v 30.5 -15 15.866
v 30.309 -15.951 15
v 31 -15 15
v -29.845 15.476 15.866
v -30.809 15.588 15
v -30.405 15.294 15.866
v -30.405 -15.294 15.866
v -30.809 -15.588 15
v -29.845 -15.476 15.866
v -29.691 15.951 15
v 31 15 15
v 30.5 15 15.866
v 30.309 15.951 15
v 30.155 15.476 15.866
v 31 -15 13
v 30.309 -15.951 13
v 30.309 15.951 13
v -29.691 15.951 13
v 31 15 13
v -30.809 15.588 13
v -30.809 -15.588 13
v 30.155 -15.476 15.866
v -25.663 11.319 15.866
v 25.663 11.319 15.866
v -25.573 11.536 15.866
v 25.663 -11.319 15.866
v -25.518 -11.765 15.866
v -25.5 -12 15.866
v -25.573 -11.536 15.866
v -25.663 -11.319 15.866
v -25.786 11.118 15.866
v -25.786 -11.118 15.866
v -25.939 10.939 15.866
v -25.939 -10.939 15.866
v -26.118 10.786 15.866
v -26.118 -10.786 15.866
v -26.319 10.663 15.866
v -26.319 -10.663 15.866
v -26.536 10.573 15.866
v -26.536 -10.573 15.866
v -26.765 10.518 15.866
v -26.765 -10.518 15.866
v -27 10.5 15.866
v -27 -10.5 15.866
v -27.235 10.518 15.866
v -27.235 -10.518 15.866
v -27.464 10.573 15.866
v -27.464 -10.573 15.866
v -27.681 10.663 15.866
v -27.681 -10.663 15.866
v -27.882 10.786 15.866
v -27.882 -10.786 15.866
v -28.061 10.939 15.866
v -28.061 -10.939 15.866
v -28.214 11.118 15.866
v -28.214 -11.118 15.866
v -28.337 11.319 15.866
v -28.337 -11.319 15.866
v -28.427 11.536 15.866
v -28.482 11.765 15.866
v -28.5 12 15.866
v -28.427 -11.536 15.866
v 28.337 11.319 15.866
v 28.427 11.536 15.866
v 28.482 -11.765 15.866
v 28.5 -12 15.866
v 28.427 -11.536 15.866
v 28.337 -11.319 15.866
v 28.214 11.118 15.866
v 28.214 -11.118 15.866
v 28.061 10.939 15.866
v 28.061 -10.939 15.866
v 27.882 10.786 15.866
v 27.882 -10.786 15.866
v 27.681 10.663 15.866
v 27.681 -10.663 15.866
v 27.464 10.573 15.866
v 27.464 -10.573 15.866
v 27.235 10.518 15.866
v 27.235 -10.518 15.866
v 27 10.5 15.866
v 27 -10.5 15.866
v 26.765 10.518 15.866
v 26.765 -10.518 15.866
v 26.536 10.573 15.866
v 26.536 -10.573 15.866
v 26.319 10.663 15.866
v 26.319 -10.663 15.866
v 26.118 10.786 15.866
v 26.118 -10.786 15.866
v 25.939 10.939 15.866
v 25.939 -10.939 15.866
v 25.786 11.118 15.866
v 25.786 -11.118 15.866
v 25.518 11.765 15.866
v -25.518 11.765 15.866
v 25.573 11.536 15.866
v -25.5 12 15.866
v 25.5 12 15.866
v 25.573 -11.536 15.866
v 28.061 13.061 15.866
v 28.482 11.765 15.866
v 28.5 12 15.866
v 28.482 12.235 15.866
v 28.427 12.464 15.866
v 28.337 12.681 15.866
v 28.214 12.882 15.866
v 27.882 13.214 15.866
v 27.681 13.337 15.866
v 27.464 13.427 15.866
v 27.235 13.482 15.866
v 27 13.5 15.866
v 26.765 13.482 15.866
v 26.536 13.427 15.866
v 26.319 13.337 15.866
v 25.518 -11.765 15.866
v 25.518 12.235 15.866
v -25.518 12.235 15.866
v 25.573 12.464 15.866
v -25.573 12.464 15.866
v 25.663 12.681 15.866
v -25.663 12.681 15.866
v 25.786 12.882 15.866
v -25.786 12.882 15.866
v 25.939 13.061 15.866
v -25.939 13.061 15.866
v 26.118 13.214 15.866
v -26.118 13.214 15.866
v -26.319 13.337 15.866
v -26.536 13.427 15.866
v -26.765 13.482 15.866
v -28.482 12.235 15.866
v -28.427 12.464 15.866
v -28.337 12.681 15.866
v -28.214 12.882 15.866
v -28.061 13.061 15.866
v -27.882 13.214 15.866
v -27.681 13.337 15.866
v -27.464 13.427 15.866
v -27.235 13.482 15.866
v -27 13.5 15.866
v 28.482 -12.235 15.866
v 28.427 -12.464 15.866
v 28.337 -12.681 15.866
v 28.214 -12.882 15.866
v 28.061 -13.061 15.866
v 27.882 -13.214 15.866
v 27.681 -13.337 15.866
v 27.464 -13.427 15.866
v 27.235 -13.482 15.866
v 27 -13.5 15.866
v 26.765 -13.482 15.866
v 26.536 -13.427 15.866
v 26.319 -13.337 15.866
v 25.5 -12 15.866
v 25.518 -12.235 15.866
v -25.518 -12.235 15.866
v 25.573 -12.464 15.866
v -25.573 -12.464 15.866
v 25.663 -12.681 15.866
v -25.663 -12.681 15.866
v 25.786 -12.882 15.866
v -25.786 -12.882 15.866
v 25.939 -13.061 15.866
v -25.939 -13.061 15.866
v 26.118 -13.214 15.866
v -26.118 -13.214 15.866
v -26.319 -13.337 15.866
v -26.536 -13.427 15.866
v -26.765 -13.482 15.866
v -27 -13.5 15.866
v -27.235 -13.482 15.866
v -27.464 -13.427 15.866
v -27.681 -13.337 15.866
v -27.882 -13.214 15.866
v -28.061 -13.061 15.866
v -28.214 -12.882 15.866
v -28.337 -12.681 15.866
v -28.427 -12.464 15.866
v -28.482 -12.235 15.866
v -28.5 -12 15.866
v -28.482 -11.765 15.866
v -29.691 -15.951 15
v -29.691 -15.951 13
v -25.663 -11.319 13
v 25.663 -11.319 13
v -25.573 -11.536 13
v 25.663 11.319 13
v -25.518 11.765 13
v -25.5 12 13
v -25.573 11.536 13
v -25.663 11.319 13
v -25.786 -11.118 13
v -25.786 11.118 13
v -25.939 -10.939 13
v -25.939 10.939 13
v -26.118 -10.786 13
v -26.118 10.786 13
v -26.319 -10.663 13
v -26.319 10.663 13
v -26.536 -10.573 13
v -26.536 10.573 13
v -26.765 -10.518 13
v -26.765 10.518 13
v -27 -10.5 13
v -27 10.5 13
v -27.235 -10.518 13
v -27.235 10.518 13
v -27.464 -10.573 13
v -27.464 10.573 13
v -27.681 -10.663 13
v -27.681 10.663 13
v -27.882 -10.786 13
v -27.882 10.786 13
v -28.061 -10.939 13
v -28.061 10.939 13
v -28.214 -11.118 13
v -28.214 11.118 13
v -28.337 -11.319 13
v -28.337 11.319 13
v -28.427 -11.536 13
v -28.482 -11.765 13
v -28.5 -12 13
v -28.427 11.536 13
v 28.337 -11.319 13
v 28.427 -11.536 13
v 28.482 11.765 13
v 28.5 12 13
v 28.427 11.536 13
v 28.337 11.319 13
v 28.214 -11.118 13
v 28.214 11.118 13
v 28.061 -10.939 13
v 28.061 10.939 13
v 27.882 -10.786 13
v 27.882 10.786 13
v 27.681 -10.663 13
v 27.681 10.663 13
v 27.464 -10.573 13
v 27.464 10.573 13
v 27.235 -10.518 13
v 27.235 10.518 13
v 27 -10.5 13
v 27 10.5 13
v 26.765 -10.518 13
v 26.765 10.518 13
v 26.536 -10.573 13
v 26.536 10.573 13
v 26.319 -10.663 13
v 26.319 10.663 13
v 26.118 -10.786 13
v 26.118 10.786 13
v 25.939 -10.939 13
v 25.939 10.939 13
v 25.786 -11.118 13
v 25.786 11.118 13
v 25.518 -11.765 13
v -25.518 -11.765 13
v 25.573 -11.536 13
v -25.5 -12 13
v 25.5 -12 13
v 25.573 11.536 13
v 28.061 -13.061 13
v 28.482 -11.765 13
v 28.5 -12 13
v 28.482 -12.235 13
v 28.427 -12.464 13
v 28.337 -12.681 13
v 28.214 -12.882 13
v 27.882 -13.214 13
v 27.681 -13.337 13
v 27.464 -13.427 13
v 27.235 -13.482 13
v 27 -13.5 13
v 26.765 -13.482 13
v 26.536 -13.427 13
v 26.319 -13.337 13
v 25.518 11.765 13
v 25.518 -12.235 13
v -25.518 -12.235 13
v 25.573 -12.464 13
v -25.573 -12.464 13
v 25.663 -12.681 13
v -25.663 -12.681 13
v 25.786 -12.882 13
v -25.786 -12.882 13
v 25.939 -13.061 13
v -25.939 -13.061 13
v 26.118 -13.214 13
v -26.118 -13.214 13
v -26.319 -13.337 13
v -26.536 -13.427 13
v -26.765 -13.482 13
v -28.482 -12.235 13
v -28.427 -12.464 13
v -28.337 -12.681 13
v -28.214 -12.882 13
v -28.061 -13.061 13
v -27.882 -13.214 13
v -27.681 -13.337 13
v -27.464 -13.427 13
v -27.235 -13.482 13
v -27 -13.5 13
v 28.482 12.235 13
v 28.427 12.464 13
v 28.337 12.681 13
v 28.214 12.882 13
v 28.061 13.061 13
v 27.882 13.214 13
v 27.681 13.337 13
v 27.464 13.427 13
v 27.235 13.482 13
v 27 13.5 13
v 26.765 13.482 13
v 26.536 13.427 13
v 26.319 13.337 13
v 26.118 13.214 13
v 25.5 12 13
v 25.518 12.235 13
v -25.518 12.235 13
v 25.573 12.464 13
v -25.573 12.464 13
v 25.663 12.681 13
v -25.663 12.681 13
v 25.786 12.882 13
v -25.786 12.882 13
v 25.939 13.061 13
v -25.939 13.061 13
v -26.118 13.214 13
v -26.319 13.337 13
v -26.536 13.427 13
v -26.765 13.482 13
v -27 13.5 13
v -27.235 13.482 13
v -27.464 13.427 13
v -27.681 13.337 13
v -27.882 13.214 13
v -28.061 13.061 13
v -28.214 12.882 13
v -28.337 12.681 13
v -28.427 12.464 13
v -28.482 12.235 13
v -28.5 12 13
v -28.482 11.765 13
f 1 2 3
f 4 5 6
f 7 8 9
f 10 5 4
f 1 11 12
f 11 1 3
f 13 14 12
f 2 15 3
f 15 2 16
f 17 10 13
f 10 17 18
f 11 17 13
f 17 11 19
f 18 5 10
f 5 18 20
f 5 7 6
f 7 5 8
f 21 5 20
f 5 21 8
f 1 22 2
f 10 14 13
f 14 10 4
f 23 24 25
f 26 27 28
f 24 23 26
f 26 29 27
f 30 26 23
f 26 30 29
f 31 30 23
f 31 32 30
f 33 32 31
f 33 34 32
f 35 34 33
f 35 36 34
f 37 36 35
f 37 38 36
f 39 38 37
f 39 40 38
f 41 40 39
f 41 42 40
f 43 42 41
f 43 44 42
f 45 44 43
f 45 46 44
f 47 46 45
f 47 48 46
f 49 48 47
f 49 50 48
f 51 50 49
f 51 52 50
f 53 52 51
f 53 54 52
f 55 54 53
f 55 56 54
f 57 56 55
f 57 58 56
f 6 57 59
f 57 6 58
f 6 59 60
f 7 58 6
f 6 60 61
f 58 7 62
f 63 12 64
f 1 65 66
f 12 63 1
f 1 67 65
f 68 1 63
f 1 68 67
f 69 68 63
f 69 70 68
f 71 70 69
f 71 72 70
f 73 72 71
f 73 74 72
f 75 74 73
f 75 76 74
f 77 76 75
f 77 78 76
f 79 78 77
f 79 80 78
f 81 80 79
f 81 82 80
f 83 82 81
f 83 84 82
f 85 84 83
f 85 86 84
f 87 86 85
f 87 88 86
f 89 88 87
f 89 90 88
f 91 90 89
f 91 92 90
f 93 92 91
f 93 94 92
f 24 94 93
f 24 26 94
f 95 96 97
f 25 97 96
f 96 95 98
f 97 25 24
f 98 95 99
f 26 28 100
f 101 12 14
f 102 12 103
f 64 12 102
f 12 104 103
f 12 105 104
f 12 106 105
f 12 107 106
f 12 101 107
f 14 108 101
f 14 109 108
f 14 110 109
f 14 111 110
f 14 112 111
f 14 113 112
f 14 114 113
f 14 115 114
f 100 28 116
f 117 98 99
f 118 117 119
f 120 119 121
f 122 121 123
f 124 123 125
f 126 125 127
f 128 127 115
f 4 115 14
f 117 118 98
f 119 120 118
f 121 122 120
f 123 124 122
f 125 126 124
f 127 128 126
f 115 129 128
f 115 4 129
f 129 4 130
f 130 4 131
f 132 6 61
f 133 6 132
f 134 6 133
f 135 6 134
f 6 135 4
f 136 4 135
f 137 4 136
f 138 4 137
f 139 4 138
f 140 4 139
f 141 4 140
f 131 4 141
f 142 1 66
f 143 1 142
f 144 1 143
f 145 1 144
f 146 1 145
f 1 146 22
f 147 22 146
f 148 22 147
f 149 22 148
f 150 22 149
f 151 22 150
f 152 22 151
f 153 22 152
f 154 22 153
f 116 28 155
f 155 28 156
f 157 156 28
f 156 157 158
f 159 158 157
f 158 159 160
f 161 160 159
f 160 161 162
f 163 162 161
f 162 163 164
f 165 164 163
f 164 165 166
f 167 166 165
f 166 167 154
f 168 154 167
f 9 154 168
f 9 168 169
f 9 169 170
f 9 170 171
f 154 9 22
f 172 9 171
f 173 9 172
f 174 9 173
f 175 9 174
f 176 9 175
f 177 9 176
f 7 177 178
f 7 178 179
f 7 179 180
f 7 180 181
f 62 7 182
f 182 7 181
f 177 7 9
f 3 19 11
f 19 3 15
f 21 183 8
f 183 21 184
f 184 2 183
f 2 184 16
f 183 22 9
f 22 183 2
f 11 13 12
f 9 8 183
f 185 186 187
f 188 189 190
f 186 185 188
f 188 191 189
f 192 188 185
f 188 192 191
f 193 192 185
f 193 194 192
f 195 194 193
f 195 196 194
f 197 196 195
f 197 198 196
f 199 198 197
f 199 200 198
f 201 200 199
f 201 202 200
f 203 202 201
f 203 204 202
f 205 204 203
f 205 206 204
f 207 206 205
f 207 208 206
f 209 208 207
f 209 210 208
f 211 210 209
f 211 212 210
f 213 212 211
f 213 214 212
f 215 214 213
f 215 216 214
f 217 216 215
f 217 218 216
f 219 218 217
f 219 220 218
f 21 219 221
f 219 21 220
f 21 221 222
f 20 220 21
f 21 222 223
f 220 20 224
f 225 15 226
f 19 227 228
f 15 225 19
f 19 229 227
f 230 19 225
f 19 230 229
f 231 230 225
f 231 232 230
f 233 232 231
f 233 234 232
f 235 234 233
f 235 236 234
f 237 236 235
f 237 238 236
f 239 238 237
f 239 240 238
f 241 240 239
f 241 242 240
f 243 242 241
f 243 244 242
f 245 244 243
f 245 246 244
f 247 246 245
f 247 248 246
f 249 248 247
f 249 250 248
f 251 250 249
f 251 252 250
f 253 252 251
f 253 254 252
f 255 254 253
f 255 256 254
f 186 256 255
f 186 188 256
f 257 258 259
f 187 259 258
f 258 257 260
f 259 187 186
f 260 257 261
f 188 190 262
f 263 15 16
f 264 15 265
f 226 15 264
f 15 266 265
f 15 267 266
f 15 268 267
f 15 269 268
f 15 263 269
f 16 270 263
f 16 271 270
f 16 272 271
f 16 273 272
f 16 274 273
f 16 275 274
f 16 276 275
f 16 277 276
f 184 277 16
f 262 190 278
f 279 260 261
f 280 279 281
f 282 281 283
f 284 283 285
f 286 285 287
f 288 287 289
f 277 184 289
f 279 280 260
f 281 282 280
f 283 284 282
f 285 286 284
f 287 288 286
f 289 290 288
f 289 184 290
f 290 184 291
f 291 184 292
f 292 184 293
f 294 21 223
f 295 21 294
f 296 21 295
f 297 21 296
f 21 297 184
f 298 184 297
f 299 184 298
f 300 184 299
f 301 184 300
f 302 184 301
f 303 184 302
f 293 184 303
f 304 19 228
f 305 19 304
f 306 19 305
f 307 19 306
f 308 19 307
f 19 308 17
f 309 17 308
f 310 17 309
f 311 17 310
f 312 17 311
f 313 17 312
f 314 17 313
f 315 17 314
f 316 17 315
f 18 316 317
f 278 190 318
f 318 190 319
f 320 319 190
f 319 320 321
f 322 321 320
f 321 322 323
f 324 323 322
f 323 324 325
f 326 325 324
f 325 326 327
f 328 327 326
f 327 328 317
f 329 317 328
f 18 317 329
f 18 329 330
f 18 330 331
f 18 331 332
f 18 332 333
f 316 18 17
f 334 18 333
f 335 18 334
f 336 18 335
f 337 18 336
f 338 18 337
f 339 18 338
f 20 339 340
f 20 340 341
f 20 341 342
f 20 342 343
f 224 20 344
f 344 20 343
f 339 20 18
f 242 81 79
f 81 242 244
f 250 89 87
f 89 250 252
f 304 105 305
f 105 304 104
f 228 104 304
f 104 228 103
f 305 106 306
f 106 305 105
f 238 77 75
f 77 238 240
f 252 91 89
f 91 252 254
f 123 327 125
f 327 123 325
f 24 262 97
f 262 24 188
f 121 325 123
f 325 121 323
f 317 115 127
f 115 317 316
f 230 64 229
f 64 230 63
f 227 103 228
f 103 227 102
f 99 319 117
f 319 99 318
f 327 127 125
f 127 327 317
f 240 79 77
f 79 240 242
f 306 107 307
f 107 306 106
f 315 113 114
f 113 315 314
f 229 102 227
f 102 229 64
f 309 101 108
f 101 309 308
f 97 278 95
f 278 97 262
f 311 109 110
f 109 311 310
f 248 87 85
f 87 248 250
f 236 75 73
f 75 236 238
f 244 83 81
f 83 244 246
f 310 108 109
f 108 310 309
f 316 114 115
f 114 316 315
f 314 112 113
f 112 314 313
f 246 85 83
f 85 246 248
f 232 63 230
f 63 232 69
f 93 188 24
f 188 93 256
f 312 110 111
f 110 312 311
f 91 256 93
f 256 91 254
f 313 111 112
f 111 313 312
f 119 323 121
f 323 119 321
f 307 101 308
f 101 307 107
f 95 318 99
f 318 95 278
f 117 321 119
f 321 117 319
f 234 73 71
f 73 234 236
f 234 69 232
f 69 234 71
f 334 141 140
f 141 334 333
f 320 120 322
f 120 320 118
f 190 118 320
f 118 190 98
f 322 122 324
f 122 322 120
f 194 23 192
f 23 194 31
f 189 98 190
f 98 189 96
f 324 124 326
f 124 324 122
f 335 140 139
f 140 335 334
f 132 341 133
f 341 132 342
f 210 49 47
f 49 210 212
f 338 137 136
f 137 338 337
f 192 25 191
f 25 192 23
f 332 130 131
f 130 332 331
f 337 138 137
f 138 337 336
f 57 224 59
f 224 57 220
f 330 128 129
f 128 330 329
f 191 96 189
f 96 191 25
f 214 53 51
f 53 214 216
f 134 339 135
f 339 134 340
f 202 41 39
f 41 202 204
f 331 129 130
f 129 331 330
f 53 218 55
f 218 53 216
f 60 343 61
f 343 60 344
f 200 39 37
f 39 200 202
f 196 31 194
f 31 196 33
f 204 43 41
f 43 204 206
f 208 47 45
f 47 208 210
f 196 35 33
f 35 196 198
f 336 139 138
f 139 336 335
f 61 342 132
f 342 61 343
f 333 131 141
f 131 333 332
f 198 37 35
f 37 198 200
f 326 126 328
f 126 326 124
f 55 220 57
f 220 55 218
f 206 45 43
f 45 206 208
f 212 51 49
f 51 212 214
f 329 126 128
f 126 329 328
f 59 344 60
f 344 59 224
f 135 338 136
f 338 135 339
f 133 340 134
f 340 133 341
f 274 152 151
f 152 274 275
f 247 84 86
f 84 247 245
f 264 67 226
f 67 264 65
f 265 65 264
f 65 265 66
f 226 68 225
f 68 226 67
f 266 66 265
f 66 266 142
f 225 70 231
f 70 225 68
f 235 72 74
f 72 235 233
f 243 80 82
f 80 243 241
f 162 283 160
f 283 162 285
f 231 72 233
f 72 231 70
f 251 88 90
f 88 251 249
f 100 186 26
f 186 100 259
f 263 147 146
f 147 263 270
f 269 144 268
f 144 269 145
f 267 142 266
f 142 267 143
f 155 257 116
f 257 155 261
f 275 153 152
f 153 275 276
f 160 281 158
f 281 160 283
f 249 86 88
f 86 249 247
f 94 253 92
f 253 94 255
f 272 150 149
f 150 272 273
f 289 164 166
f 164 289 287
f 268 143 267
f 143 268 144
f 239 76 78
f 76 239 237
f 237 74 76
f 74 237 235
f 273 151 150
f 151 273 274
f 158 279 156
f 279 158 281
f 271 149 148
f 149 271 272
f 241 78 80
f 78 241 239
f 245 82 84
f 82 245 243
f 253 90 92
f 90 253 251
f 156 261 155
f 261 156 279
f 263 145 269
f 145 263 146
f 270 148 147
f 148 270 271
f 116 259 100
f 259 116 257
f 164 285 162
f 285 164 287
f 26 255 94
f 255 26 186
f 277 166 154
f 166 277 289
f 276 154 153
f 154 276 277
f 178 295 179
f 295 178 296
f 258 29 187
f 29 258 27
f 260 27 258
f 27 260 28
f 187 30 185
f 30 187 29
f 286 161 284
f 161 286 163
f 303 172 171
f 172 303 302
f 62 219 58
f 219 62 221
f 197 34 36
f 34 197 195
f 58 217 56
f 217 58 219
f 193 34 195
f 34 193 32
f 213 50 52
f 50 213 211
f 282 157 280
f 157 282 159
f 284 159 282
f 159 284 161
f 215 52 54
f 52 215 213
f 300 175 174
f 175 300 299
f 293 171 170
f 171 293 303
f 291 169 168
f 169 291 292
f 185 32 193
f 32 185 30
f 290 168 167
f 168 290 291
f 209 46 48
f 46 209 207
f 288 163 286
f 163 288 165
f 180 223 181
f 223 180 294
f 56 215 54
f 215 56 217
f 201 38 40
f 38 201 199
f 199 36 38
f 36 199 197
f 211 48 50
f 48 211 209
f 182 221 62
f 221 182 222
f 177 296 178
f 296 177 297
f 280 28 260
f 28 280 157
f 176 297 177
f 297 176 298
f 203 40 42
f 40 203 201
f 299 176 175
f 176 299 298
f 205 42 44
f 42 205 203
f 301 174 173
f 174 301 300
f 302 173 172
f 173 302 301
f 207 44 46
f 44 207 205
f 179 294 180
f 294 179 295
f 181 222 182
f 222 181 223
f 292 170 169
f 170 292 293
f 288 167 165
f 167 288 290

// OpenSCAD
// SolarVerteiler


module Outer(){

    minkowski(){
        cube([60,30,20],center=true);
        sphere(r=1);
    }   
}
module Inner() {
    translate([0,0,3])
    cube([56,26,20],center=true);
}


module Hole() {
    translate([0,10,0])
    rotate([90,0,0])
    cylinder(d=8,h=20,center=true,$fn=40);
}

module Deckel() {
    translate([0,0,5])
    difference() {
        Outer();
        translate([0,0,-2])
        cube([62,32,20],center=true);

        translate([27,12,0])
            Loecher();
        translate([-27,12,0])
            Loecher();
        translate([27,-12,0])
            Loecher();
        translate([-27,-12,0])
            Loecher();

    }
}

module Steg() {
    translate([27,12,0])
    difference() {
        Pfosten();
        Loecher();
    }
    translate([-27,12,0])
    difference() {
        Pfosten();
        Loecher();
    }
    translate([27,-12,0])
    difference() {
        Pfosten();
        Loecher();
    }
    translate([-27,-12,0])
    difference() {
        Pfosten();
        Loecher();
    }
}

module Pfosten() {
        cube([5,5,20],center=true);
}
module Loecher() {
        cylinder(d=3,h=30,center=true,$fn=40);
}
module Box() {

    difference() {
        
        Outer();
        Inner();
        translate([18,0,0])
        Hole();
        translate([0,0,0])
        Hole();
        translate([-18,0,0])
        Hole();
        translate([0,-20,0])
        rotate([90,0,0])
        cylinder(d=3,h=50,center=true,$fn=40);
        
        
        translate([-20,0,0])
        cylinder(d=3,h=50,center=true,$fn=40);
        
        translate([20,0,0])
        cylinder(d=3,h=50,center=true,$fn=40);
    }

    Steg();


}

//Box();
Deckel();
